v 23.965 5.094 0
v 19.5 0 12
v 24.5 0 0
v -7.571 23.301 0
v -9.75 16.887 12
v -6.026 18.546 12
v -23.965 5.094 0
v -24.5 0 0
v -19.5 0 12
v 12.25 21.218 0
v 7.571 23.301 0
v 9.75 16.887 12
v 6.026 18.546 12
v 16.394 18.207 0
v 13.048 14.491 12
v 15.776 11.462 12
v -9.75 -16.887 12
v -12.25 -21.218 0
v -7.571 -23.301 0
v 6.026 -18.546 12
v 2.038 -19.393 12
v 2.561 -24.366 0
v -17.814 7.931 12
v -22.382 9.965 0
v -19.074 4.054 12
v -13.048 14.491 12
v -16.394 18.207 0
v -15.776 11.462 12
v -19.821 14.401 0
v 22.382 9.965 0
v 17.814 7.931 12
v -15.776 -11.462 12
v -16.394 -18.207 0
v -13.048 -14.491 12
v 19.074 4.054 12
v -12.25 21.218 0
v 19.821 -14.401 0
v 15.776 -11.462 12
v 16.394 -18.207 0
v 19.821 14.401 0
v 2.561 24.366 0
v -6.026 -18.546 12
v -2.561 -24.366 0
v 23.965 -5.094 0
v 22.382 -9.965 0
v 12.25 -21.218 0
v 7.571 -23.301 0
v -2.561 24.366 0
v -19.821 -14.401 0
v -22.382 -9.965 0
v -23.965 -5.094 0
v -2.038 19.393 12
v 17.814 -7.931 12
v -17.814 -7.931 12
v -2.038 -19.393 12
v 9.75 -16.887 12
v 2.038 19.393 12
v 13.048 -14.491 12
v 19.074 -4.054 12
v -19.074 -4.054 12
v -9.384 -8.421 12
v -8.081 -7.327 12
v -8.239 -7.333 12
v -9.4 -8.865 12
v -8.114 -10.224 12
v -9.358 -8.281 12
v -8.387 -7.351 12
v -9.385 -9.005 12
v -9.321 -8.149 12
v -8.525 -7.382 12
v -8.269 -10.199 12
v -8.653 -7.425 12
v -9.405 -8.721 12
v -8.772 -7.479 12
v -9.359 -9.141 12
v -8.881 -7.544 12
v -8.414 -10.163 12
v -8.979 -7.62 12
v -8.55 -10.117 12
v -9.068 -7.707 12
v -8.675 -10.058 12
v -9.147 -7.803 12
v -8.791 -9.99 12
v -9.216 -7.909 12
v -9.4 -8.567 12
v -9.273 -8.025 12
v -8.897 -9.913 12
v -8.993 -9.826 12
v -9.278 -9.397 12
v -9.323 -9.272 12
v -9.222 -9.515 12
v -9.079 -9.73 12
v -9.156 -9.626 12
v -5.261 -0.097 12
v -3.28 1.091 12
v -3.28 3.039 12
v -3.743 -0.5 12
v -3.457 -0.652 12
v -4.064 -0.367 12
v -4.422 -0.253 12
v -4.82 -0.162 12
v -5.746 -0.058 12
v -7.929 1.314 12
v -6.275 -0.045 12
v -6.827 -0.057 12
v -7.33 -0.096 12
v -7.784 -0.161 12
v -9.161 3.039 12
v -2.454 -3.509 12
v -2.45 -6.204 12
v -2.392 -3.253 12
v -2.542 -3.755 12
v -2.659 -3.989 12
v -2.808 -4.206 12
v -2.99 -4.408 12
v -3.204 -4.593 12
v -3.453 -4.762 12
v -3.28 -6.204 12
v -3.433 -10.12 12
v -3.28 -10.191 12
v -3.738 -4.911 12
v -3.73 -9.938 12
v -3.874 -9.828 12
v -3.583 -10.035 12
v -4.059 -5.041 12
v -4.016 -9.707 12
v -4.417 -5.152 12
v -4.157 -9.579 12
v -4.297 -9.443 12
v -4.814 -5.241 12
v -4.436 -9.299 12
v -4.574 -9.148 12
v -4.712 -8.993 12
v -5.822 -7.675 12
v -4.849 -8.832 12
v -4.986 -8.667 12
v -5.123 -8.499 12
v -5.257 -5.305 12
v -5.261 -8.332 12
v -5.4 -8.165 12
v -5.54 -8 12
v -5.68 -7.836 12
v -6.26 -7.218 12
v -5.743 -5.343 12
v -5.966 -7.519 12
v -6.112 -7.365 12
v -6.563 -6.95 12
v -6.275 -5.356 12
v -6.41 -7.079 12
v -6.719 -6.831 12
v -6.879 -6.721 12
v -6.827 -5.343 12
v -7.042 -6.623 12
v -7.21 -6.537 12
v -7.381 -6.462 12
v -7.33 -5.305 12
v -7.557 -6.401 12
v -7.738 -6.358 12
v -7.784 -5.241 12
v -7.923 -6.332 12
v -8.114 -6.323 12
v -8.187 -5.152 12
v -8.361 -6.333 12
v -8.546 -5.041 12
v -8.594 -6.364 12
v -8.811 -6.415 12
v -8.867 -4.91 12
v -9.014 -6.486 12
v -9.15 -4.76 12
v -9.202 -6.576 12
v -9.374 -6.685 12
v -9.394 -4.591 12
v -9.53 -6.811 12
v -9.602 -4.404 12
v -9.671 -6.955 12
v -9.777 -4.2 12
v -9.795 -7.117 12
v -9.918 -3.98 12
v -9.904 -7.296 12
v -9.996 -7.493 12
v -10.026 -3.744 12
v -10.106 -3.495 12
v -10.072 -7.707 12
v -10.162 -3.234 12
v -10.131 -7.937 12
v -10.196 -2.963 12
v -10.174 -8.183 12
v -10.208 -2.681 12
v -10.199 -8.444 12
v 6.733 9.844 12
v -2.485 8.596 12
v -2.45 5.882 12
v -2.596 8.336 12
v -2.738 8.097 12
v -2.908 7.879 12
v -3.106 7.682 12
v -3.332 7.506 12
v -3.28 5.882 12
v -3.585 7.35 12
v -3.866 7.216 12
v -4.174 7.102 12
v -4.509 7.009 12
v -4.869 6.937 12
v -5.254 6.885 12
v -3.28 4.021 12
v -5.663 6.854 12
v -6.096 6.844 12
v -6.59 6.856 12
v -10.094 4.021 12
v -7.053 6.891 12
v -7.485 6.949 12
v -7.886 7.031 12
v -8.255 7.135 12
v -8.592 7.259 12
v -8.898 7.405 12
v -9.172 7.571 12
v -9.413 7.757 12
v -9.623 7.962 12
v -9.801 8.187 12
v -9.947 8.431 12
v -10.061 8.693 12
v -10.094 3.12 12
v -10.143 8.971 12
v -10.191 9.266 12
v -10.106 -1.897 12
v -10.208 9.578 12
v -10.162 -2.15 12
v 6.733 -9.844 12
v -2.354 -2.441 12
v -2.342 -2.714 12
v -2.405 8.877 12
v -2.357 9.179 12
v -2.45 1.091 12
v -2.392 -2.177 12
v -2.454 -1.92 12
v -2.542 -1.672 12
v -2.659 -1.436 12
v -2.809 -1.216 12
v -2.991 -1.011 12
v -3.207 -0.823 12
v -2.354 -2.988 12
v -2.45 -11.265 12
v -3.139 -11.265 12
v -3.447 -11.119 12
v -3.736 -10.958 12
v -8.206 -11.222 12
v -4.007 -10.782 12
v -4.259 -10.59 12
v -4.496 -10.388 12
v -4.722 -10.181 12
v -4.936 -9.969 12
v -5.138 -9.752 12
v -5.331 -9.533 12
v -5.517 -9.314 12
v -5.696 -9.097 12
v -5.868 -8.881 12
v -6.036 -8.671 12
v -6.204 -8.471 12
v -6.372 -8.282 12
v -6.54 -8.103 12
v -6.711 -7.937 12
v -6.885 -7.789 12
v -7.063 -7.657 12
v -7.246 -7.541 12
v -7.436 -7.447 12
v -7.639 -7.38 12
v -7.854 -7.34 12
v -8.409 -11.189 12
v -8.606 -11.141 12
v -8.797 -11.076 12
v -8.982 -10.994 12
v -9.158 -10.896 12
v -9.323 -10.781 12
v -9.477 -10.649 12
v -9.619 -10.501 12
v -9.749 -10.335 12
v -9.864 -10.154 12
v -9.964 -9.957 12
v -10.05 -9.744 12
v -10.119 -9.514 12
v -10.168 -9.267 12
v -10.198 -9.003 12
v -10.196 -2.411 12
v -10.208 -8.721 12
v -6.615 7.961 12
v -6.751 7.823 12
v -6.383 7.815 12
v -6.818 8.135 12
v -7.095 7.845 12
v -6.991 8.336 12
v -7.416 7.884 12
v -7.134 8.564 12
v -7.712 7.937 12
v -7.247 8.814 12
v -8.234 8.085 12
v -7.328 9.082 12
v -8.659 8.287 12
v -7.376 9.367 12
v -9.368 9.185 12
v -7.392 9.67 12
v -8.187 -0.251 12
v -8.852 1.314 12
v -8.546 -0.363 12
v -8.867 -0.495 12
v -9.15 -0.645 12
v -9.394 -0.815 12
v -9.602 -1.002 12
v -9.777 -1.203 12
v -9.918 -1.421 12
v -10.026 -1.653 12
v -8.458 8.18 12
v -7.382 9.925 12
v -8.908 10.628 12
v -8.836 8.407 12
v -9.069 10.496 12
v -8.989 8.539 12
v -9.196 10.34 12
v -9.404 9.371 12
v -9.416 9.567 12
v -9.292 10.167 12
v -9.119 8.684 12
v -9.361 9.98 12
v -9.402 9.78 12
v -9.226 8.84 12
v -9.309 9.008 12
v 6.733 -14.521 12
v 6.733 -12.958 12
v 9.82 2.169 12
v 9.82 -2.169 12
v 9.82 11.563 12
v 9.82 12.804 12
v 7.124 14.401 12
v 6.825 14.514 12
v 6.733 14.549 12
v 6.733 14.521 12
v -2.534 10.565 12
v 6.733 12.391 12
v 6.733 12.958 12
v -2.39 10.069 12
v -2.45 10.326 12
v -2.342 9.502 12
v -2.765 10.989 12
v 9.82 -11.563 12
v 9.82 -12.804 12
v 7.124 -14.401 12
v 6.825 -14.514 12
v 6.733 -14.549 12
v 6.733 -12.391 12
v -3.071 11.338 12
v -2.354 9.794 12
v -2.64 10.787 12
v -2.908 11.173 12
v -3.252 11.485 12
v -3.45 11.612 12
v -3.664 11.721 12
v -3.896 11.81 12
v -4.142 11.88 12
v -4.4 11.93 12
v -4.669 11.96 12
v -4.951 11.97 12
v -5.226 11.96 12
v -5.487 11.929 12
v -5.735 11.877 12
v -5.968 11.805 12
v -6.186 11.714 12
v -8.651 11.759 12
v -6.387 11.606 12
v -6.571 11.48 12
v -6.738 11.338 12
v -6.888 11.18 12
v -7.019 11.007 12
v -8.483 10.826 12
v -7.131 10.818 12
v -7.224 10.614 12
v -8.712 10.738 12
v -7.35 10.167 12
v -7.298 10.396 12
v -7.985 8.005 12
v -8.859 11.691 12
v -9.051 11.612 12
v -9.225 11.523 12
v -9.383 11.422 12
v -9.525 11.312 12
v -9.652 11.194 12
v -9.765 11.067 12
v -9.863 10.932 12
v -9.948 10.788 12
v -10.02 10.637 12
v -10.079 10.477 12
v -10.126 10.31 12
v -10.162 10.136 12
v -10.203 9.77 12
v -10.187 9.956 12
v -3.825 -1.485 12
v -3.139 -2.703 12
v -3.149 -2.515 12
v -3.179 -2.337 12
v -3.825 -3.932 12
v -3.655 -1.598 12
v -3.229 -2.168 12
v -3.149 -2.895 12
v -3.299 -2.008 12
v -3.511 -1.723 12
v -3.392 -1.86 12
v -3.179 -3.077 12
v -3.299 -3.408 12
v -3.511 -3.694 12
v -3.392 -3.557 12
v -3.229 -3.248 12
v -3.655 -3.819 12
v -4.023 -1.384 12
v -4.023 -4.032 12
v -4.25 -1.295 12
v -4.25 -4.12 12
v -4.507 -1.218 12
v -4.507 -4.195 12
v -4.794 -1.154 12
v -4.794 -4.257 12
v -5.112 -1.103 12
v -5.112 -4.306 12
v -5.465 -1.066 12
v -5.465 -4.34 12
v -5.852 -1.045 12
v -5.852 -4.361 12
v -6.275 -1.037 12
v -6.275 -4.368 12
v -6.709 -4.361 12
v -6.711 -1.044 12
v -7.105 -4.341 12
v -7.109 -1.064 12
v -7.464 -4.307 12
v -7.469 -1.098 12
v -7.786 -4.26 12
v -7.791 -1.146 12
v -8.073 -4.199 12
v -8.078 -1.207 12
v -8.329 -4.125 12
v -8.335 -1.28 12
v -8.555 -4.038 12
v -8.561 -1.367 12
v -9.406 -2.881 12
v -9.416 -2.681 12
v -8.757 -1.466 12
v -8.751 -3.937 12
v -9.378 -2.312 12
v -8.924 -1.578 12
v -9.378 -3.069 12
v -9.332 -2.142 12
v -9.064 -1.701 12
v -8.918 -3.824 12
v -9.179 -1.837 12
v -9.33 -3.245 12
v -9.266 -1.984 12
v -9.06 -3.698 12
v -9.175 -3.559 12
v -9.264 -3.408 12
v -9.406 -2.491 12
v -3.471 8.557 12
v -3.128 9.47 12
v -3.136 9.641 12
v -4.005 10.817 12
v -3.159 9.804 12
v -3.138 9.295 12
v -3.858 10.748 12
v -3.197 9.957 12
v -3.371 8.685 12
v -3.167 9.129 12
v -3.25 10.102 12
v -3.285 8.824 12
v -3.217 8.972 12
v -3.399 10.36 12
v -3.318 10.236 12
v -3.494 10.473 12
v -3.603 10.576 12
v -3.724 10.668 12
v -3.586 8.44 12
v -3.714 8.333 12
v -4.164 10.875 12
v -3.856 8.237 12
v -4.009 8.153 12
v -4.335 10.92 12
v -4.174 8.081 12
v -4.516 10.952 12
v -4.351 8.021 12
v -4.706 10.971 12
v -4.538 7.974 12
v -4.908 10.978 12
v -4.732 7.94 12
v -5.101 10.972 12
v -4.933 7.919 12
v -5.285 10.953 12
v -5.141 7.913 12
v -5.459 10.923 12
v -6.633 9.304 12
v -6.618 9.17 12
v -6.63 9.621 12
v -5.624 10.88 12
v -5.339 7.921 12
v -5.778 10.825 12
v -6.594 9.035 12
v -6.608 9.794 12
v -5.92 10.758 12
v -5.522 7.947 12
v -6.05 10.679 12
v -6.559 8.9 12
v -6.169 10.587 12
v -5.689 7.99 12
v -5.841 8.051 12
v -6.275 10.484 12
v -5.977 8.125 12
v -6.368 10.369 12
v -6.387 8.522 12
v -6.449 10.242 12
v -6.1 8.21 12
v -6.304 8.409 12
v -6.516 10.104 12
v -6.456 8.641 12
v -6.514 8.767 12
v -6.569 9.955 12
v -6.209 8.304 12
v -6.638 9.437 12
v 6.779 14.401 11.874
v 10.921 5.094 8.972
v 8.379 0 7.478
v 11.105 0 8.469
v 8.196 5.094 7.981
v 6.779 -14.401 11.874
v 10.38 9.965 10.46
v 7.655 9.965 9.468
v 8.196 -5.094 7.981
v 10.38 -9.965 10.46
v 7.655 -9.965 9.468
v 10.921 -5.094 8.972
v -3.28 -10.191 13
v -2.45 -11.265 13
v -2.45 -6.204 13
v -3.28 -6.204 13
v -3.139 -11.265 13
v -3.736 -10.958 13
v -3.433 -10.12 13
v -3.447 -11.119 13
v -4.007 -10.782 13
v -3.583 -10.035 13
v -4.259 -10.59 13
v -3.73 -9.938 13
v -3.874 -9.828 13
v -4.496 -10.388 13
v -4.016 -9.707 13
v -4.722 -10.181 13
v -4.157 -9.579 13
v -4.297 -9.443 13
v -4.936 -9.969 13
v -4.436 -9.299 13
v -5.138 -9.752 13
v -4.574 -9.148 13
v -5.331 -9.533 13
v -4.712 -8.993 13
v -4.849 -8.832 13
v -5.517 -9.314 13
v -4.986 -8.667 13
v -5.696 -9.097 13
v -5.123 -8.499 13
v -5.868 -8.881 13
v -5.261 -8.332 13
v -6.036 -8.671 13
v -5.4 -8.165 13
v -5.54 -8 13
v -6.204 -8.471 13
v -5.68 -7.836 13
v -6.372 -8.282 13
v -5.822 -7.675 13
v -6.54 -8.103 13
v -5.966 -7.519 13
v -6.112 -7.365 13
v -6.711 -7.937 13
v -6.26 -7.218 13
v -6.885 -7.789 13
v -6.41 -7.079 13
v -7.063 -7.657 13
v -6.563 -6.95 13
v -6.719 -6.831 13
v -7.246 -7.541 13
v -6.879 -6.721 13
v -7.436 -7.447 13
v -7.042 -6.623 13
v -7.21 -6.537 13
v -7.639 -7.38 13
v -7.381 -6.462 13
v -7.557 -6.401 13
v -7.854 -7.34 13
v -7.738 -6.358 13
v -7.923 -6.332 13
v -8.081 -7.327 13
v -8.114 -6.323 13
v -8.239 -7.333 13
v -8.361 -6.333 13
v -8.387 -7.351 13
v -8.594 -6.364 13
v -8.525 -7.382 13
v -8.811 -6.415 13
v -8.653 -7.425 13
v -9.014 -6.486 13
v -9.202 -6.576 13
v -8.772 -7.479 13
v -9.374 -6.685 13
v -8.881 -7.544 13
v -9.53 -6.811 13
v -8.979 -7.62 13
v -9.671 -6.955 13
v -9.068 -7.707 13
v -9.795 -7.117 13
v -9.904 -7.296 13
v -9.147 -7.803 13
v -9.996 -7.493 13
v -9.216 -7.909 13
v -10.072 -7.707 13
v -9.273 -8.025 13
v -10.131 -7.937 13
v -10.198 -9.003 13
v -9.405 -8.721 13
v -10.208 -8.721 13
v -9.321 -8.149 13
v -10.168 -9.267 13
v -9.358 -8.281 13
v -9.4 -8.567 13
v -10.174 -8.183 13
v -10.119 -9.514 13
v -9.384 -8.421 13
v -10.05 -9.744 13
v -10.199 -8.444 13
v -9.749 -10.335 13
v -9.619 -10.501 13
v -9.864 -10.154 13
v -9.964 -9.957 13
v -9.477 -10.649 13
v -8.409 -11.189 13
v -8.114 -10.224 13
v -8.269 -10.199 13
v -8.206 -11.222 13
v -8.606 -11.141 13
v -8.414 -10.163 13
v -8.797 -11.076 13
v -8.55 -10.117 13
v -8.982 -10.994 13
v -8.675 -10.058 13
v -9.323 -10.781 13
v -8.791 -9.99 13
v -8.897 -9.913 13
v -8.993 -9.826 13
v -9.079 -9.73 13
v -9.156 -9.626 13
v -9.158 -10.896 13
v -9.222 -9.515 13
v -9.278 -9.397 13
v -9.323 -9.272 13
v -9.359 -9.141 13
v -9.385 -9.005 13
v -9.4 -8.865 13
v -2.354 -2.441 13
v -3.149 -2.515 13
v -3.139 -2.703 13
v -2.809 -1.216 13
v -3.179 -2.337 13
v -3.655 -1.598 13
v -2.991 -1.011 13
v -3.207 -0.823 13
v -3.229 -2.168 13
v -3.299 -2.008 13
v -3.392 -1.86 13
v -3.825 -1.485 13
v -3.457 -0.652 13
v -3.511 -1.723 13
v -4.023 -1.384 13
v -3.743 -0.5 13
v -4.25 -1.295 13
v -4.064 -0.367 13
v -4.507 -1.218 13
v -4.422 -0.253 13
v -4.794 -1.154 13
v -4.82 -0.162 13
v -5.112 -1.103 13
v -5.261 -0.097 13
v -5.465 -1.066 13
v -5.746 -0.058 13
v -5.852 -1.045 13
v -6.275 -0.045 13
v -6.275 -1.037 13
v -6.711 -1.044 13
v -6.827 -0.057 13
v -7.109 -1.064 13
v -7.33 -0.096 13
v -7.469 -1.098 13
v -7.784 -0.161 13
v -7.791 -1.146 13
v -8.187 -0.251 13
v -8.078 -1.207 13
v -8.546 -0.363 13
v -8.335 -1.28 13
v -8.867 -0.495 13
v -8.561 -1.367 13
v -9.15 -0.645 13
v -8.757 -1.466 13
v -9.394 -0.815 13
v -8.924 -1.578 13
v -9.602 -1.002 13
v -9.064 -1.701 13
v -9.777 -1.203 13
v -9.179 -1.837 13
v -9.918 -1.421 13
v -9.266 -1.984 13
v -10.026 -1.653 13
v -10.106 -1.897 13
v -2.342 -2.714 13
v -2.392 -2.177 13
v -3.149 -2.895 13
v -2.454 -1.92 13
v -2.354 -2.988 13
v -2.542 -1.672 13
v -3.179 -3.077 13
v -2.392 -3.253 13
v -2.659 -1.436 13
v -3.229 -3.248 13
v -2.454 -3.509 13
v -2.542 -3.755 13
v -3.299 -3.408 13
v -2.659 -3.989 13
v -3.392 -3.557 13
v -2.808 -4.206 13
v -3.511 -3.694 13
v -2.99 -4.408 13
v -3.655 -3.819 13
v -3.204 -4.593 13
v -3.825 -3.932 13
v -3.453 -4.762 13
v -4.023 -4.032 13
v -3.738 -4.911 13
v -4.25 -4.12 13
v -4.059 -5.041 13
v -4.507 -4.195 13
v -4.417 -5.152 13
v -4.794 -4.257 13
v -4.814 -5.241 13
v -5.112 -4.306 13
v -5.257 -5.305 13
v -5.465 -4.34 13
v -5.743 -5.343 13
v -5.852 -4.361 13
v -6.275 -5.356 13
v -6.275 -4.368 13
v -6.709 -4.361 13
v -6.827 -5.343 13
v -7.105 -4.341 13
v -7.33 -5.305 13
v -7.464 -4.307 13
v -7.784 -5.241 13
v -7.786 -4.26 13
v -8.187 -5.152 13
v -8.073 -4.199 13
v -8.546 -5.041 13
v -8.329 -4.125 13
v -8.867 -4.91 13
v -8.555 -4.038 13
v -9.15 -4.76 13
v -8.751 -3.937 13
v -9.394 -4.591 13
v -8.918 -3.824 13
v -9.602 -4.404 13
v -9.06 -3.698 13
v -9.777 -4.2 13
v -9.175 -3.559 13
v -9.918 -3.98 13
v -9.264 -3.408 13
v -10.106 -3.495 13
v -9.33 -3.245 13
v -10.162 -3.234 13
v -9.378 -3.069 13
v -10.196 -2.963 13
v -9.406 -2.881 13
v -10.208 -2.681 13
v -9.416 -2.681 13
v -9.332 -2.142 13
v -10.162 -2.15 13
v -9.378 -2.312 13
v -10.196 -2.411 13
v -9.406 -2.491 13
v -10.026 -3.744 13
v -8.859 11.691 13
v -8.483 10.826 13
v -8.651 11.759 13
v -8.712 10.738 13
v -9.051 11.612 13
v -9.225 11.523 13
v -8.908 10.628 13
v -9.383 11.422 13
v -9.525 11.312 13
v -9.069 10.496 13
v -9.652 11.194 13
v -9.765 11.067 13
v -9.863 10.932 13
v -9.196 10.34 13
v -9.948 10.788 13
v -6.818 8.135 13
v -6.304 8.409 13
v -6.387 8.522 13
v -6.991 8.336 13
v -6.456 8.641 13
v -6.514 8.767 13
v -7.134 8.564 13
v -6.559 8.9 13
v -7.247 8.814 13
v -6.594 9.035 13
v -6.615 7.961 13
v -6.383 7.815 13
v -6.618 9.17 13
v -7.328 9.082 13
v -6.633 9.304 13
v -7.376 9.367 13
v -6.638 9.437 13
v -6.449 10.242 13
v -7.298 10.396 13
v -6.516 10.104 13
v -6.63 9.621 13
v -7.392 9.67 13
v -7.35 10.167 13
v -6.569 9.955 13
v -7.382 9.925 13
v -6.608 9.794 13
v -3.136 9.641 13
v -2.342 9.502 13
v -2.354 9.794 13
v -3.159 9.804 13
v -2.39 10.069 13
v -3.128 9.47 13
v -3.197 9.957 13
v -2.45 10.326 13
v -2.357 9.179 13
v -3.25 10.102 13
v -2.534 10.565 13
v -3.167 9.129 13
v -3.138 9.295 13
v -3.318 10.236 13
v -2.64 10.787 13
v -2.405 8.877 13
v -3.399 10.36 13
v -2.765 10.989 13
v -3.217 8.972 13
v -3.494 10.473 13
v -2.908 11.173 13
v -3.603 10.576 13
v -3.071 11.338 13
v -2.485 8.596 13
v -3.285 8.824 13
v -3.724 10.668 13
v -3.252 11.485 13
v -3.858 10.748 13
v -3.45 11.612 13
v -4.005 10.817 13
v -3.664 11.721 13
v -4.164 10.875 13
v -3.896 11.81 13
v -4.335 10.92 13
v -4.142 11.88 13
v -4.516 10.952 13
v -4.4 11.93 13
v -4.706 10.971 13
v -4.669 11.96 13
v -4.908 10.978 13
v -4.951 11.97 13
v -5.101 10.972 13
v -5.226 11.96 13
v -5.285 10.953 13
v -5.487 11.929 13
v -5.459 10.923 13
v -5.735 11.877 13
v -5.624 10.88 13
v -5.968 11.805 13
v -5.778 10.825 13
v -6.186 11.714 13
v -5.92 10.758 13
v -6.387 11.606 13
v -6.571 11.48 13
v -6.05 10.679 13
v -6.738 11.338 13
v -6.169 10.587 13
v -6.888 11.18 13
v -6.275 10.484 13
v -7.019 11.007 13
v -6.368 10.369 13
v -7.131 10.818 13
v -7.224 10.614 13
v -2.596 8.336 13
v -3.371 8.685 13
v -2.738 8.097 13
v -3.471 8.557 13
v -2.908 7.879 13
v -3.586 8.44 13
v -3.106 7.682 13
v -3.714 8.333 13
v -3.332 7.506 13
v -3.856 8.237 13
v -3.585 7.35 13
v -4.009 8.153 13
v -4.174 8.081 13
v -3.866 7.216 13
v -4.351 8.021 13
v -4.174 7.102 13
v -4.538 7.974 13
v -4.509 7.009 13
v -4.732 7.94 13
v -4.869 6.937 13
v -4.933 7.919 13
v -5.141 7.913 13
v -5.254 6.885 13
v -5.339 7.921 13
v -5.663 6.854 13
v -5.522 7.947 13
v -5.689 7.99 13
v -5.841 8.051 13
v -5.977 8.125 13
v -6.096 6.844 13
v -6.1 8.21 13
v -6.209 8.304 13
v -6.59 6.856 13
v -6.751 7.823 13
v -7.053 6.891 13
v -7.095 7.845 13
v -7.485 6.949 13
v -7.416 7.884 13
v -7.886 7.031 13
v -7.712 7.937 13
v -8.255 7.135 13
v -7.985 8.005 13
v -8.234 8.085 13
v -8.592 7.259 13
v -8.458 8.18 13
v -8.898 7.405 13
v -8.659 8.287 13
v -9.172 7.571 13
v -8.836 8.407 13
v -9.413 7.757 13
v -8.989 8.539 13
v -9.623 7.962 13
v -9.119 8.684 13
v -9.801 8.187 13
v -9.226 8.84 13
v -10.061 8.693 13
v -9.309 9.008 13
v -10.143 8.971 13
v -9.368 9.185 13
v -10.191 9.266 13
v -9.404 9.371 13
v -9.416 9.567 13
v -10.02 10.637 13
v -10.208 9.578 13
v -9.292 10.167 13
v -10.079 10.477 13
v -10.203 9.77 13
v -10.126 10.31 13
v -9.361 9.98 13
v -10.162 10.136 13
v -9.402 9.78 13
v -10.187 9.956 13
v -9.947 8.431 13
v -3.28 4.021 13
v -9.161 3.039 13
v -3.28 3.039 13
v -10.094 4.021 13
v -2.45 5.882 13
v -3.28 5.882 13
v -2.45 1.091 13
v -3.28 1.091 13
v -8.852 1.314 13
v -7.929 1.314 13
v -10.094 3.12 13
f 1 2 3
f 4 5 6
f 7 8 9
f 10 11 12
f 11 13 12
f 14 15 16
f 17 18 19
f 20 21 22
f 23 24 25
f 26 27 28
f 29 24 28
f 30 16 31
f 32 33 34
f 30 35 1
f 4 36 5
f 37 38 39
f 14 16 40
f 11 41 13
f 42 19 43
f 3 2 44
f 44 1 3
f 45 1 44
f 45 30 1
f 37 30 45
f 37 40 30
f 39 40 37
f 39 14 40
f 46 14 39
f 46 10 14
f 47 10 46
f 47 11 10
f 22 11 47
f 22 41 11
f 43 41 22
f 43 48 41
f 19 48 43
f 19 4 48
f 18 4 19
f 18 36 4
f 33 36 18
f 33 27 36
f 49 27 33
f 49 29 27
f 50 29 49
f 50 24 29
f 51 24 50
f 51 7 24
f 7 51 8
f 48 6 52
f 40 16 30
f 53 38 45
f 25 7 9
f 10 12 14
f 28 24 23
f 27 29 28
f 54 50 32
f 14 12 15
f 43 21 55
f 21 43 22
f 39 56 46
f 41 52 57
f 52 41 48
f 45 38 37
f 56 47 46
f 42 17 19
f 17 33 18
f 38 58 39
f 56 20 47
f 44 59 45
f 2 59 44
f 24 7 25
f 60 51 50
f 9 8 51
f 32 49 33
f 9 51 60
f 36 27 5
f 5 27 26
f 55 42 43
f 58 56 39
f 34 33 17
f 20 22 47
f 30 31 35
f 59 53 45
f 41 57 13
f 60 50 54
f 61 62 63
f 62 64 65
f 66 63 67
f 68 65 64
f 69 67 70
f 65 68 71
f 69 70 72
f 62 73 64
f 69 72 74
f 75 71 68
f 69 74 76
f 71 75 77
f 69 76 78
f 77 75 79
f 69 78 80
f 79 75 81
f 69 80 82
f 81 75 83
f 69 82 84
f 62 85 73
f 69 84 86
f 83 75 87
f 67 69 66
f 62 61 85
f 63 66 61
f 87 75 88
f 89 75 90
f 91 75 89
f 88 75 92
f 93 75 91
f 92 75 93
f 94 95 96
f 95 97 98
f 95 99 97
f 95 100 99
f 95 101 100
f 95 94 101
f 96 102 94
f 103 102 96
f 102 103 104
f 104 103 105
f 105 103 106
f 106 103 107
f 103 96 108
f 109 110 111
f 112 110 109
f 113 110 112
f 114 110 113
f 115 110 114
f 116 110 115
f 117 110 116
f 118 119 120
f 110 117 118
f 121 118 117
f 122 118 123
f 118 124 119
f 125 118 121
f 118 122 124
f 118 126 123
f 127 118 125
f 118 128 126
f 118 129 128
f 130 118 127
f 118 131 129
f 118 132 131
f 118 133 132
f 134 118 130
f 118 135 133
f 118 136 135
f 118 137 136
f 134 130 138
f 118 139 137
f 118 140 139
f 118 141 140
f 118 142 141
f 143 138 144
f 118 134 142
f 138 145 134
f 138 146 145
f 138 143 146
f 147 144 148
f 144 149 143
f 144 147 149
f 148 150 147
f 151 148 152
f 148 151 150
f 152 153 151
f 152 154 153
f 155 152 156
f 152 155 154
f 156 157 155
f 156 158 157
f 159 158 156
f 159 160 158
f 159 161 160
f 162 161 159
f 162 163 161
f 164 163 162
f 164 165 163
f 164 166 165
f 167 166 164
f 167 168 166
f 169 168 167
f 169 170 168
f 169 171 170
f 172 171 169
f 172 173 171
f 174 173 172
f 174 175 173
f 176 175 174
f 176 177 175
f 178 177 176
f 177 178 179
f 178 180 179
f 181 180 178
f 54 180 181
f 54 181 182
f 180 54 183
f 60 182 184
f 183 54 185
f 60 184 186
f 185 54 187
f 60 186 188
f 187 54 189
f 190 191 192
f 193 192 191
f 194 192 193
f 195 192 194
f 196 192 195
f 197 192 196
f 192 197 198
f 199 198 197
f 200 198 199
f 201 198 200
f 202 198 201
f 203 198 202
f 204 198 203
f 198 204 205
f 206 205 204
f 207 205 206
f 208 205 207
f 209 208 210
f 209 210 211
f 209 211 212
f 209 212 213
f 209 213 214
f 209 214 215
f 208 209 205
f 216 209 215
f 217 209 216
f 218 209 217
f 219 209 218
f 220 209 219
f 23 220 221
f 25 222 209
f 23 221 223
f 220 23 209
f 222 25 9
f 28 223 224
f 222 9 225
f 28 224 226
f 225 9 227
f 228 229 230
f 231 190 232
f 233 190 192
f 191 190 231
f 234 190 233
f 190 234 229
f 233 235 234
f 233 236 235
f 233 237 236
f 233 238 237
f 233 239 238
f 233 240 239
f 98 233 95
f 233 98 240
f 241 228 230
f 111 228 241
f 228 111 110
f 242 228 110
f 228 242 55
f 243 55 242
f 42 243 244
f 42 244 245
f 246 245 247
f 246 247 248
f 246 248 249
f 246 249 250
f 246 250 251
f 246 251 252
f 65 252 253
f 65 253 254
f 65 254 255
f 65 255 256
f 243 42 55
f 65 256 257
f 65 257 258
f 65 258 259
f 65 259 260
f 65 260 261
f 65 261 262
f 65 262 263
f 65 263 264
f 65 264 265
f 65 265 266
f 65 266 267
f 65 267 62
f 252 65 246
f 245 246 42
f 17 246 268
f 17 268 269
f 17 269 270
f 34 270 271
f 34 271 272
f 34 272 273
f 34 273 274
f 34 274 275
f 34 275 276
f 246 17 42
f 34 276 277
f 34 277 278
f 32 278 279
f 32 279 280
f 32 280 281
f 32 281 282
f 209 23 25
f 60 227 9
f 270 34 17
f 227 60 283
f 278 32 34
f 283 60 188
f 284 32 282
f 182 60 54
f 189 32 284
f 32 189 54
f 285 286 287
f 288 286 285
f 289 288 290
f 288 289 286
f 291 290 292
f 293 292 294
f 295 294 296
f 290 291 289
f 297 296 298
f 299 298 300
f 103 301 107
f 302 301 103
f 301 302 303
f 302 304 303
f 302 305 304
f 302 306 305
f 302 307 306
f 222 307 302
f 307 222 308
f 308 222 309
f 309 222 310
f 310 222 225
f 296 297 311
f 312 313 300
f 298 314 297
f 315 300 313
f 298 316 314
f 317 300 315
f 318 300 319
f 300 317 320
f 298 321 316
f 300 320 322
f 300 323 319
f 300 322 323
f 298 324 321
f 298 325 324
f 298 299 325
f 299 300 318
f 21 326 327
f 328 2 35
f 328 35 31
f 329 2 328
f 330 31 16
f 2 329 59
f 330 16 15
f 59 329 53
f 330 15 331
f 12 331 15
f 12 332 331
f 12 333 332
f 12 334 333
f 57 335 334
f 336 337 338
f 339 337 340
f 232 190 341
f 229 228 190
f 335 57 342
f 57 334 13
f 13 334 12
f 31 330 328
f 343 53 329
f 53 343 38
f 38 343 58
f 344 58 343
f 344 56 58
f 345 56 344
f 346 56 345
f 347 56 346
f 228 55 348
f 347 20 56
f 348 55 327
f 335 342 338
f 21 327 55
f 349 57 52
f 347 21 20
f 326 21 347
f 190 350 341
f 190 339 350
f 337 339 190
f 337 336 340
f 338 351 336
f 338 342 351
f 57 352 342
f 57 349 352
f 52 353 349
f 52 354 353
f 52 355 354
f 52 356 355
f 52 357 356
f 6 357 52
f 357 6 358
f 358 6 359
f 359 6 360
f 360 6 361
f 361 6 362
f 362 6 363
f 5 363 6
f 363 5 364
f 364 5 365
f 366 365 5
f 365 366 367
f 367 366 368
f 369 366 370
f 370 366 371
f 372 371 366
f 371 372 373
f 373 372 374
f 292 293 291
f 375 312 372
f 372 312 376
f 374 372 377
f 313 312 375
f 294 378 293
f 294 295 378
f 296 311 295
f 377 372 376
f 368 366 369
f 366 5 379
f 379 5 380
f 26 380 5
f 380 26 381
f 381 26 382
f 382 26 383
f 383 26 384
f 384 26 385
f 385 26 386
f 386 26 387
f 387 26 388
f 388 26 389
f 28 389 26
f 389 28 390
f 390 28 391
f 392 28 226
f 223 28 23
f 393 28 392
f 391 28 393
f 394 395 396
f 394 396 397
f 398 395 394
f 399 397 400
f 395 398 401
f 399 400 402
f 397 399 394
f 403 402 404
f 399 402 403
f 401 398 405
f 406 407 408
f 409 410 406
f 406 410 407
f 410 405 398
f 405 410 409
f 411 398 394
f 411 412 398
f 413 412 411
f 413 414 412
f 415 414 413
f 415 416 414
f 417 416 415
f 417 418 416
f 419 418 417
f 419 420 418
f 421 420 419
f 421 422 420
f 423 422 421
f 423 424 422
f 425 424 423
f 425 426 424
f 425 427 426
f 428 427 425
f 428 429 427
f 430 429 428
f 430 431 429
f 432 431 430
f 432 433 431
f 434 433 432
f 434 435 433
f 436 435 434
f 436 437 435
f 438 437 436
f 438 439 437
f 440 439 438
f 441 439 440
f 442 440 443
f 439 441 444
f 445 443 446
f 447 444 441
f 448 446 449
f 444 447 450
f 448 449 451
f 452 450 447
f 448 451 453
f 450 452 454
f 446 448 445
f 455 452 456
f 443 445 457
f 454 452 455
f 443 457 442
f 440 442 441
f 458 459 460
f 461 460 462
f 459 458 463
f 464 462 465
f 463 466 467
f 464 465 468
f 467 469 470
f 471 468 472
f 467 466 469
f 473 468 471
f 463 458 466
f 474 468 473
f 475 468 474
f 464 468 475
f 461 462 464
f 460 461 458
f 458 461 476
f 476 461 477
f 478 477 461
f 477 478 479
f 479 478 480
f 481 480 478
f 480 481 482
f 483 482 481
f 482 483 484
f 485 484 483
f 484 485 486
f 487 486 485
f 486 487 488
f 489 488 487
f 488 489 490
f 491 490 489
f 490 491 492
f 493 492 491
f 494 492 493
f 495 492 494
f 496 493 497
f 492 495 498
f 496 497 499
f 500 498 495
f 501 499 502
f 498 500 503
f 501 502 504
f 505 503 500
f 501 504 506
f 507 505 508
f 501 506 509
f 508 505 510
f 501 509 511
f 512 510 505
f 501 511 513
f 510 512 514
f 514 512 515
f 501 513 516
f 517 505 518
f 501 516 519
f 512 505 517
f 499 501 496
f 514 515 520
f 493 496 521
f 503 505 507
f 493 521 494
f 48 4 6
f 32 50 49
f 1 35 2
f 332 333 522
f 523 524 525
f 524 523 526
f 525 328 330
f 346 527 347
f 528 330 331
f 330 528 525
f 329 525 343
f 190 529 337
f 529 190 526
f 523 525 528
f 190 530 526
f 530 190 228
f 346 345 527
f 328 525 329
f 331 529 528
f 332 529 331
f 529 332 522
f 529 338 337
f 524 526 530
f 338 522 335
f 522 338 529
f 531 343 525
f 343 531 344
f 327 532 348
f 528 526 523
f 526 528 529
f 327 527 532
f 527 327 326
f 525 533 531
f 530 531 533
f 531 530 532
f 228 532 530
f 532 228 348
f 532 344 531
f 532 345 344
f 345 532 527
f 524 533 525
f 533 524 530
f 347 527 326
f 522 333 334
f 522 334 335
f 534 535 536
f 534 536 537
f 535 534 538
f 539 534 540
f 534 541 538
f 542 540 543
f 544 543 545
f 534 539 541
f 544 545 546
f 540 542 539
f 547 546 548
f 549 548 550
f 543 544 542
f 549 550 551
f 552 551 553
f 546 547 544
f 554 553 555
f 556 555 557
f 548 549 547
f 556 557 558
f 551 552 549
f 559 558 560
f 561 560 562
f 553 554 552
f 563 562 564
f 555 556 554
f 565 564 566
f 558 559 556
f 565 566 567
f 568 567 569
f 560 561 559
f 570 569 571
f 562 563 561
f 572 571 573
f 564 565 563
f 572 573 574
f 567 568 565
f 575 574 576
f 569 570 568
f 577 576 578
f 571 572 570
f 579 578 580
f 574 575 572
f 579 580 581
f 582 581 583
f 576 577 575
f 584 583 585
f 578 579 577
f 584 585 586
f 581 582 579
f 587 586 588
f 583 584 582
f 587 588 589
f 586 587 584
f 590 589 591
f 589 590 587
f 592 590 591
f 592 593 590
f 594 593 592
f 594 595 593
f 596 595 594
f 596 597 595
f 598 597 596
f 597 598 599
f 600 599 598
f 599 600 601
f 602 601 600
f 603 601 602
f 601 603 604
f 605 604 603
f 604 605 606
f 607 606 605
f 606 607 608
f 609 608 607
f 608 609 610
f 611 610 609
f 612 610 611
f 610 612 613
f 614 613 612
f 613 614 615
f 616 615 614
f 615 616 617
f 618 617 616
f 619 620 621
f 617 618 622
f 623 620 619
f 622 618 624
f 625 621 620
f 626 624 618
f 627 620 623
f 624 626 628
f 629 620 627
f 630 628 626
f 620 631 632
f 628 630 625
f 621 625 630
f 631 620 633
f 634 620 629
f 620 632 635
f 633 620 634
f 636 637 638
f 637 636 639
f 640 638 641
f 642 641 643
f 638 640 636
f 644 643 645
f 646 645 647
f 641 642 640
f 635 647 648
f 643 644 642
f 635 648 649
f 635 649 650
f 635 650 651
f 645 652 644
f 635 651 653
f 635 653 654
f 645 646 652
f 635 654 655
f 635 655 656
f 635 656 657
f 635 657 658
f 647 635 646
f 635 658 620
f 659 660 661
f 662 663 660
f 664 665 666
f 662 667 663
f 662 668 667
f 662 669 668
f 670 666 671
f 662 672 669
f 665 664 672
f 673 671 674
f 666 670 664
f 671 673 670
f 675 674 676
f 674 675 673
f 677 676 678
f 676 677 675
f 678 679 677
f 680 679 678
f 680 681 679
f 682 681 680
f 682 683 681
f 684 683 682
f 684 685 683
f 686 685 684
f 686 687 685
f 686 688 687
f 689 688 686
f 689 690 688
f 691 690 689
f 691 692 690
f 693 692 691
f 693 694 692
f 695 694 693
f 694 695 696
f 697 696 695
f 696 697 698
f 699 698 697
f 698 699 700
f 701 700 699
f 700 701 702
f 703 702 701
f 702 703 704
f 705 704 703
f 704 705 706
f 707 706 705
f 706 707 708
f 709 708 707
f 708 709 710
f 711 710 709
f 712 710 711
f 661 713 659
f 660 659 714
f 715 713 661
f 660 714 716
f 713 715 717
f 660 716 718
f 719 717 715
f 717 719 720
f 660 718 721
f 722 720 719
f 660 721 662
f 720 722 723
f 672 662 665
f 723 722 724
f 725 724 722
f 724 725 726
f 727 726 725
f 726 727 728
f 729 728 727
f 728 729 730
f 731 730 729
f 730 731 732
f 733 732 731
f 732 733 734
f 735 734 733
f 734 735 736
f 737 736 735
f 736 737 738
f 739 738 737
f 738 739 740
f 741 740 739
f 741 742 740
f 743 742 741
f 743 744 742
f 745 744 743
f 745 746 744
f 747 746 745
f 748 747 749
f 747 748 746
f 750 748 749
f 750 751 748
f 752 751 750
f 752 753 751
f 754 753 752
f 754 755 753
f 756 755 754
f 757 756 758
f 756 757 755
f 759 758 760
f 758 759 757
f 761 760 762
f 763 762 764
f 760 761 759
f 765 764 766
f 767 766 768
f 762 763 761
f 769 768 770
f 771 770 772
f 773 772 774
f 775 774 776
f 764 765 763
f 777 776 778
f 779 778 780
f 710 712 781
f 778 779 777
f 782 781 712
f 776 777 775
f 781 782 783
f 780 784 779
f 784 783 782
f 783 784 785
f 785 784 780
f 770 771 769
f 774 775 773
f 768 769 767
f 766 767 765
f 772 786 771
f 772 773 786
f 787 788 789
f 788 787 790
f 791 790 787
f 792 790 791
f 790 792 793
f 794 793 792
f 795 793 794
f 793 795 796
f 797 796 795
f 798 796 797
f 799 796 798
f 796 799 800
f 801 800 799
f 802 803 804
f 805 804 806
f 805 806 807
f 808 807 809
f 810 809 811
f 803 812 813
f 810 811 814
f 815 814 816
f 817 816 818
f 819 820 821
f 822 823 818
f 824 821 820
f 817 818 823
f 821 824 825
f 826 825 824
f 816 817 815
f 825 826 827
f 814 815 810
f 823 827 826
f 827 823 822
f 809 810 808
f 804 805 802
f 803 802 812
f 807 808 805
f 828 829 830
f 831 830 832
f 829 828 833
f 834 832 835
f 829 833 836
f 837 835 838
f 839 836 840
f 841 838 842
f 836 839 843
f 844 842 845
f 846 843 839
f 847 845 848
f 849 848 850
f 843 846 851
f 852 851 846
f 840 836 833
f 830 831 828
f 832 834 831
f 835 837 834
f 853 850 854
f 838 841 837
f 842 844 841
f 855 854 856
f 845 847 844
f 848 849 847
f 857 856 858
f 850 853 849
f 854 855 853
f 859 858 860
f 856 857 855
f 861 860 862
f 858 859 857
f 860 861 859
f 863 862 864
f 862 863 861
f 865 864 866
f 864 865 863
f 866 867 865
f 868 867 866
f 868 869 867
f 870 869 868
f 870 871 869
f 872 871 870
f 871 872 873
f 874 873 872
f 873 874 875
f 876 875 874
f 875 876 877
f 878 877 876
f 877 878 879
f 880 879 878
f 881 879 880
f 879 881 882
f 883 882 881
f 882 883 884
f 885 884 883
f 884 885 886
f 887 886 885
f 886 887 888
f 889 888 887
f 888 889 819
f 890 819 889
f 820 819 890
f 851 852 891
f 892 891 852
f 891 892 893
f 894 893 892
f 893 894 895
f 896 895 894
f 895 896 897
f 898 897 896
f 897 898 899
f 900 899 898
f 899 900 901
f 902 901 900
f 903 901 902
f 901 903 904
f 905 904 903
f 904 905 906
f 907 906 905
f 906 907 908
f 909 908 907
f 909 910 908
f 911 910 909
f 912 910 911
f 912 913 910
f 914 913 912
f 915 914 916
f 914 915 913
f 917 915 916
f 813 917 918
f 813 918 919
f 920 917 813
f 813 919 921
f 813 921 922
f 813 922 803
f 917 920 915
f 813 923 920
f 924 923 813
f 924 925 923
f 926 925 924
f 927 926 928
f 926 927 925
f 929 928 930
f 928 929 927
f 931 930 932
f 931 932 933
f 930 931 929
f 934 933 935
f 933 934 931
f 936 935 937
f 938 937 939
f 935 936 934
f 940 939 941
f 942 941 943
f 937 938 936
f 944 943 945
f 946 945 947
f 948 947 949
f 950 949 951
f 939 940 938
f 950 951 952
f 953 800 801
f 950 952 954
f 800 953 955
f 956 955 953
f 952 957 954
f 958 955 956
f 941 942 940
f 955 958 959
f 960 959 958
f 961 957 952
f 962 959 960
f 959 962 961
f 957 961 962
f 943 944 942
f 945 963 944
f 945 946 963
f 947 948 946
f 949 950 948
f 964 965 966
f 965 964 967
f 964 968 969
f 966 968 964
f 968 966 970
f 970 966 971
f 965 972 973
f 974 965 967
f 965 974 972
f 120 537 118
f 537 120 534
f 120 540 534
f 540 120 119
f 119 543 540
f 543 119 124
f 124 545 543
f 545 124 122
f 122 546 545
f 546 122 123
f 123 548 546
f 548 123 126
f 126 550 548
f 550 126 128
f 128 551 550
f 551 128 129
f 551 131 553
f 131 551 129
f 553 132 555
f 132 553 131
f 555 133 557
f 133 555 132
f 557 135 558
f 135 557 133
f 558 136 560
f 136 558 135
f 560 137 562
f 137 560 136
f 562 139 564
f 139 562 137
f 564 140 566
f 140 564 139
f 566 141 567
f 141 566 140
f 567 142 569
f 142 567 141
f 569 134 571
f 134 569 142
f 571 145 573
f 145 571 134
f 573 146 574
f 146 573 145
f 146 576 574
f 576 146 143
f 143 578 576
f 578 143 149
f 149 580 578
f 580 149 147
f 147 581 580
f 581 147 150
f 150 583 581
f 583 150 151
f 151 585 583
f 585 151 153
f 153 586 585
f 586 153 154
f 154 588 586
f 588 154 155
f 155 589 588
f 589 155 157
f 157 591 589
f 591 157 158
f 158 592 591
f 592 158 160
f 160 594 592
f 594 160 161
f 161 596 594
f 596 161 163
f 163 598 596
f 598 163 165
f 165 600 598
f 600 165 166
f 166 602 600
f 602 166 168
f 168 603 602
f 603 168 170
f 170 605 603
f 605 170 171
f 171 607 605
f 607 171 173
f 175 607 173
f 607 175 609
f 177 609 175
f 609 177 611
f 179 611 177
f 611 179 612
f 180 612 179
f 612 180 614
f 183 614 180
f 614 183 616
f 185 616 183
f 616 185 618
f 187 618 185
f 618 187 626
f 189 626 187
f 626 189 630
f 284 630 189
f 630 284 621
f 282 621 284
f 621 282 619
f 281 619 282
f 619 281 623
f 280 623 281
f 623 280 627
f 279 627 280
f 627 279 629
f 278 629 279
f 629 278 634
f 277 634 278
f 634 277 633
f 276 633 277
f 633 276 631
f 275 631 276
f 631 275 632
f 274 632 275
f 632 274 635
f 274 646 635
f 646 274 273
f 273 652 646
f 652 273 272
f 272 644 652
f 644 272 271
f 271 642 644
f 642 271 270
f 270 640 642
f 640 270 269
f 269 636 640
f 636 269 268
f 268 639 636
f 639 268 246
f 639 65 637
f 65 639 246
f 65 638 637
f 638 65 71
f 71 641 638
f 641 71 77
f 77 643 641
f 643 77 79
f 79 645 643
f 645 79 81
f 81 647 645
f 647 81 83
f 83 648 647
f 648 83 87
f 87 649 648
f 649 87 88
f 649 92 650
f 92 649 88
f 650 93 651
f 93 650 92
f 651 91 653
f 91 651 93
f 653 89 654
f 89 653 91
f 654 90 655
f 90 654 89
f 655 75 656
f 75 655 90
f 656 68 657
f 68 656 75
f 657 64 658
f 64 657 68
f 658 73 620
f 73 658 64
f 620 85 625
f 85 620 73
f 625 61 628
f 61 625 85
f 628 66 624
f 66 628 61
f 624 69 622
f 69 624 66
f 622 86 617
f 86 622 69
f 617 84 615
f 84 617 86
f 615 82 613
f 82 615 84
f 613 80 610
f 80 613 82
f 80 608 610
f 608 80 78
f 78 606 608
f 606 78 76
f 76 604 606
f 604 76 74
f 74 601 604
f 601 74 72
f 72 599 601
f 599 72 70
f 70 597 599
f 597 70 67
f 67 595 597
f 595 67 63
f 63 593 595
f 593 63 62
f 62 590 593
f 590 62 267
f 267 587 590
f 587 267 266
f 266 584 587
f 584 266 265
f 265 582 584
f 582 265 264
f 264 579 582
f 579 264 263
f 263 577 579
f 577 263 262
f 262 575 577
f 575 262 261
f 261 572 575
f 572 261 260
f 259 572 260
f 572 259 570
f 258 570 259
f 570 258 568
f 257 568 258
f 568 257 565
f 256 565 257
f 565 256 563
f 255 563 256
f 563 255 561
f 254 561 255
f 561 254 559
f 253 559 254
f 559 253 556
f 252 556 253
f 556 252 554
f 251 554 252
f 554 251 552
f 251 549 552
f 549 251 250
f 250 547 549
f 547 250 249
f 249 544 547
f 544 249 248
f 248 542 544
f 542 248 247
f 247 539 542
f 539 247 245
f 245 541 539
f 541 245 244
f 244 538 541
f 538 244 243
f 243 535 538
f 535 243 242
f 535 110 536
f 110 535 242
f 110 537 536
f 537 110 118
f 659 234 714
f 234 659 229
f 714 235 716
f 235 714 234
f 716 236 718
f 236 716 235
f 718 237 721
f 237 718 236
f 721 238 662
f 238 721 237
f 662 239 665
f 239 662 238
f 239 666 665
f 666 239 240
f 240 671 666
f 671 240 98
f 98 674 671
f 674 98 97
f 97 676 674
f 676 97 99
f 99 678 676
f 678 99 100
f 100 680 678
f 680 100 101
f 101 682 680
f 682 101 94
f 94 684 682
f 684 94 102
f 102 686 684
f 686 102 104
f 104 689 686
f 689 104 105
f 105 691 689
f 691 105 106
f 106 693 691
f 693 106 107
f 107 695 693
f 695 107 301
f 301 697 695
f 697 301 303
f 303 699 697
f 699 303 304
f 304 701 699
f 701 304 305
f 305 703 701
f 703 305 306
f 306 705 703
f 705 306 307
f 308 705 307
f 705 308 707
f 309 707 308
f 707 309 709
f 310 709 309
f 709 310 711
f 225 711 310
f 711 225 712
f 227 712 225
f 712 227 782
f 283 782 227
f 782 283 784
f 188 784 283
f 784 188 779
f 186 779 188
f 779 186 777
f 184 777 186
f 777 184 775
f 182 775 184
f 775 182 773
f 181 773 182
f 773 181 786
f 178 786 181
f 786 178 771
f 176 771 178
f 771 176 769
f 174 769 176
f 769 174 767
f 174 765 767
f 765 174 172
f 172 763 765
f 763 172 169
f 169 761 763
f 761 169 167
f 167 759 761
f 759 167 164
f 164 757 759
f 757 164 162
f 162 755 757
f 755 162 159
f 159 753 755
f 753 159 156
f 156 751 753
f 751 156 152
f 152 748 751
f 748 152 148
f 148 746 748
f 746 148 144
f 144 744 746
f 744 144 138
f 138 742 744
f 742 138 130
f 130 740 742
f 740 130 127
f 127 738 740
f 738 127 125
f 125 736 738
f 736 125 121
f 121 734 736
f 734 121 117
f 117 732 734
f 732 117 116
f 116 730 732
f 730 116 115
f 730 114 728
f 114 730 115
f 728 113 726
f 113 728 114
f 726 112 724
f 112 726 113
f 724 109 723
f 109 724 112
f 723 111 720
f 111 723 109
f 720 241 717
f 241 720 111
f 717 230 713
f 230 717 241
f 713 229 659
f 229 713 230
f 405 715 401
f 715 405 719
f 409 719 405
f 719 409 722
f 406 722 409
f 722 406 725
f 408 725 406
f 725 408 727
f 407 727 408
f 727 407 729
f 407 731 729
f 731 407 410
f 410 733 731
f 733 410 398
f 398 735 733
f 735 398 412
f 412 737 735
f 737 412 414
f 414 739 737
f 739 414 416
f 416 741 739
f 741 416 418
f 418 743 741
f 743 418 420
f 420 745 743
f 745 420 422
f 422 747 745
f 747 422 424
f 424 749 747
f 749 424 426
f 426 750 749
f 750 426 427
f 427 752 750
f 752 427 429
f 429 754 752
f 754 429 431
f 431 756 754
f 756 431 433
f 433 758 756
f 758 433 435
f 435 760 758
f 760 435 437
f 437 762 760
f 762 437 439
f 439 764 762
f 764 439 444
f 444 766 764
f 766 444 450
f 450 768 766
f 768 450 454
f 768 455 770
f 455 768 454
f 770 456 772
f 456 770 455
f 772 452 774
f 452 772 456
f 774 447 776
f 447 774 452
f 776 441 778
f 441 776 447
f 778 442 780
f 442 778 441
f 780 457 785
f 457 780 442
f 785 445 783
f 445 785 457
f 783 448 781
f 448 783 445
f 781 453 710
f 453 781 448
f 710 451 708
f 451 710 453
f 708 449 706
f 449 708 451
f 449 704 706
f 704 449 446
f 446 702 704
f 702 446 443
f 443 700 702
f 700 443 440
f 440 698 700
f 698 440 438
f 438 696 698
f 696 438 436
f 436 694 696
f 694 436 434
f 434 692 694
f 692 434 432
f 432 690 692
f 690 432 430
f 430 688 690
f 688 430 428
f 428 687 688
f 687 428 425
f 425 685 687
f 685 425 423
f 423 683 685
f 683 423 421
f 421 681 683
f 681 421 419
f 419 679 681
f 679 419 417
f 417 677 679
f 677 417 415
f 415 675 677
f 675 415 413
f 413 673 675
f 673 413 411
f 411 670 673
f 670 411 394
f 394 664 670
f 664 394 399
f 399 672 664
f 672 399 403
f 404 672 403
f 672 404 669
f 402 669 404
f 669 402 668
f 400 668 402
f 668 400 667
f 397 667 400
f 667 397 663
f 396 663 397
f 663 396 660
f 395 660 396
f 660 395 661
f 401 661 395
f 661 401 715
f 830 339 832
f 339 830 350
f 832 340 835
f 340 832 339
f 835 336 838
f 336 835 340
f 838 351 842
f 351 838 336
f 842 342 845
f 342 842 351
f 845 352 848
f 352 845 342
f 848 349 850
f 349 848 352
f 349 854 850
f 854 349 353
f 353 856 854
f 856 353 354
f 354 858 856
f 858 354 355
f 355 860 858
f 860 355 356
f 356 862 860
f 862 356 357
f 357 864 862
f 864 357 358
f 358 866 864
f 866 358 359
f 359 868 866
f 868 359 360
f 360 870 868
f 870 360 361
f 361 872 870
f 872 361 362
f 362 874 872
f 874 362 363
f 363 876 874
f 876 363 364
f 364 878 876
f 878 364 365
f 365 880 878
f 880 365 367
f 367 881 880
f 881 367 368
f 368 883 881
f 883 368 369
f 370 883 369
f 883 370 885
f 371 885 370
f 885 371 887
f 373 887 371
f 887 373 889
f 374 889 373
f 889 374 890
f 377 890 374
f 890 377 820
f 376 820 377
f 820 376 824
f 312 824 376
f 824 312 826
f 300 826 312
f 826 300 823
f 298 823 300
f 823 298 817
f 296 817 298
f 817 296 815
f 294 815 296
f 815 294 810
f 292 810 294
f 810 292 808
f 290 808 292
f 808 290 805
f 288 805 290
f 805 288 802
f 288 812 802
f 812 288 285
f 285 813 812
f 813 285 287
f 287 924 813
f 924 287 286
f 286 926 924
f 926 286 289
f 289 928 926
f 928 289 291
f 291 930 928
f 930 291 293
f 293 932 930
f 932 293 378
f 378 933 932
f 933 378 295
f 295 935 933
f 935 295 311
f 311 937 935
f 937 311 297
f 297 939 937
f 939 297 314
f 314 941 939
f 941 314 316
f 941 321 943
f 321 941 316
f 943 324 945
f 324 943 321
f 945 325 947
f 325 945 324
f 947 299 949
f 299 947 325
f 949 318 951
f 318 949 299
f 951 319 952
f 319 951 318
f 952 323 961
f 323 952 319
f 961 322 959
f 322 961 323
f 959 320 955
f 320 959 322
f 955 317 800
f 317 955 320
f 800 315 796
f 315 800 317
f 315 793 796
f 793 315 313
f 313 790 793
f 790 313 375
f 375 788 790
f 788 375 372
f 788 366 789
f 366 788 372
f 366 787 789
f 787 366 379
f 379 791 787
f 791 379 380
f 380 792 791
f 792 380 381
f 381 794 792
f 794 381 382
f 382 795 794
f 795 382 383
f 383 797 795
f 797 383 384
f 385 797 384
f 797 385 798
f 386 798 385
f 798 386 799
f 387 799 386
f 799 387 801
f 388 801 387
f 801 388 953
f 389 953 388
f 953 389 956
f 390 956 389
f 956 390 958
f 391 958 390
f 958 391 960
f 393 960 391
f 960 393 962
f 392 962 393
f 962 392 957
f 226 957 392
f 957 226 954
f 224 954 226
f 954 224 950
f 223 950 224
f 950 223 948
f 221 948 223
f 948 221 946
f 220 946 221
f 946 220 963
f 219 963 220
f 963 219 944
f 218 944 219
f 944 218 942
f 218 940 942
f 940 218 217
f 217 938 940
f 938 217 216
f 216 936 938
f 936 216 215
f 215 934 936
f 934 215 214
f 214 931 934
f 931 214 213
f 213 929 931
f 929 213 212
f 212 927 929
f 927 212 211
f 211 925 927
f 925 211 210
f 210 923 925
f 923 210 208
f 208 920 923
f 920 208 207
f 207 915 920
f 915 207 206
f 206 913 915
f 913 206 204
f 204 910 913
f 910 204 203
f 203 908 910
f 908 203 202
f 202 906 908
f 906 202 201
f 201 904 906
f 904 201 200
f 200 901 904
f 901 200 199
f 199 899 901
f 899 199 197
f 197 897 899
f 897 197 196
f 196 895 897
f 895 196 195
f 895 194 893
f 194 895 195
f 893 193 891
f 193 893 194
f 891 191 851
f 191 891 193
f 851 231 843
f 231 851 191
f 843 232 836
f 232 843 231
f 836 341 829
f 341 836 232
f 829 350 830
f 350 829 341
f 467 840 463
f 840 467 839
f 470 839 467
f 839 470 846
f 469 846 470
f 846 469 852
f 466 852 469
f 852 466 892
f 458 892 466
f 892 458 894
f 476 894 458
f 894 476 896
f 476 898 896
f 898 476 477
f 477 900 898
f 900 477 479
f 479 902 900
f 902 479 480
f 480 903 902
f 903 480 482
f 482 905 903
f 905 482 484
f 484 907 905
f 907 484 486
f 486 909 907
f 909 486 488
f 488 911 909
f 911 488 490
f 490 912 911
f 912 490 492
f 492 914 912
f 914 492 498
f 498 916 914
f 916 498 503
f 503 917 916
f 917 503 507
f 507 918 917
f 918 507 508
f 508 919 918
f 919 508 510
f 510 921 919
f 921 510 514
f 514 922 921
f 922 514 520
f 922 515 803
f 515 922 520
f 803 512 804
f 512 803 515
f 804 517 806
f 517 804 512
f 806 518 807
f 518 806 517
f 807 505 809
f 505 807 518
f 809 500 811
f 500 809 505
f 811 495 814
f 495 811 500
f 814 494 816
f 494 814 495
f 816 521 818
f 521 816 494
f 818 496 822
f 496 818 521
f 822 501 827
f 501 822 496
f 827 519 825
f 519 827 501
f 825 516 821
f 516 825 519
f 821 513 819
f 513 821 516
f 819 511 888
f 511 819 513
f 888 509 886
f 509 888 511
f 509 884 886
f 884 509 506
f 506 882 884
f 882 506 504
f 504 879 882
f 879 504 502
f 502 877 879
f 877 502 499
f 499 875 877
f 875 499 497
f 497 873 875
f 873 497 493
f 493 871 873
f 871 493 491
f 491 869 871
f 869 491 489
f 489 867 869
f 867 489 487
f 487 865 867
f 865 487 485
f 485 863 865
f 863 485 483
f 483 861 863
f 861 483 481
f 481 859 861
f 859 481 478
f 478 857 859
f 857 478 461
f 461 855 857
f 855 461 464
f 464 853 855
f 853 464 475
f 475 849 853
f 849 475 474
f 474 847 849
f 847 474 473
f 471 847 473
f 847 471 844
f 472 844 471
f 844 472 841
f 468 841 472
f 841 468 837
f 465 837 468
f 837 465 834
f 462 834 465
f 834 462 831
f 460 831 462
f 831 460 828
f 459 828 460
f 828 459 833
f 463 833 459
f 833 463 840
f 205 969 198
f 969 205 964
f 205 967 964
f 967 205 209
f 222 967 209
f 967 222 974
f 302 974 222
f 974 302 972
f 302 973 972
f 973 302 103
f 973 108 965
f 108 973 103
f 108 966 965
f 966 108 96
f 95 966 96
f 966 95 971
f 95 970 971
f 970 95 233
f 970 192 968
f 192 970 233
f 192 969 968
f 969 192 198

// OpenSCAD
// Parametric Coin Stand
// www.thingiverse.com/gkstmr
// Goksenin Tumer
// Stand Height in mm
Stand_Height=12; 
// Coin diameter in mm
Coin_Diameter=49;
// Coin thickness in mm 
Coin_Thickness=2.8;
// Stand Text 
Coin_Label="2016";
// Font Size
FontS=08;
coinr=Coin_Diameter/2;
//Type == 0  Rectangular: Type == 1 Conical
type=1;               
if (type==0)
{
difference()
    {
minkowski(){cube ([coinr*1.2-4,coinr*2-4,Stand_Height]); cylinder (r=2, h=1);}; translate ([coinr/2,coinr,Stand_Height+coinr-6])rotate ([0,70,0])  cylinder (Coin_Thickness+0.1,coinr,coinr,true) ;
}
union () {linear_extrude(Stand_Height+2) rotate ([0,0,90]) translate ([coinr, -coinr/2, Stand_Height])  text (Coin_Label, halign = "center", size=FontS);}
};
//translate ([coinr,coinr*4,0])
if (type!=0)
{
difference() { cylinder (Stand_Height,coinr,coinr-5,false);
    translate ([0,0,Stand_Height+coinr-6])rotate ([0,70,0])
    cylinder (Coin_Thickness+0.1,coinr,coinr,false);
    ;}
  
   
union () {linear_extrude(Stand_Height+1) rotate ([0,0,90]) translate ([coinr/100, coinr/10, Stand_Height])  text (Coin_Label, halign = "center", size=FontS);}
 };

